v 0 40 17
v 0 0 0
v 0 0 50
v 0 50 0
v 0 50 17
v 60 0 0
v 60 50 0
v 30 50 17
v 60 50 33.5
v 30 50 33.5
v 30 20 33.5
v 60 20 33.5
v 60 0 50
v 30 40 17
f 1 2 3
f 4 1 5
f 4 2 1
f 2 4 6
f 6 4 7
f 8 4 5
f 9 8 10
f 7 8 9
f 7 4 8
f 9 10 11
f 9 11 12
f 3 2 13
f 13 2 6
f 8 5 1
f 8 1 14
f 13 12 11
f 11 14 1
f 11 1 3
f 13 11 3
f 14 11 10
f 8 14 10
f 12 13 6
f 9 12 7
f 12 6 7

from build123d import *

# Parameters (mm, degrees)
SKETCH1_W           = 60
SKETCH1_H           = 50
BOSS_EXTRUDE1_DEPTH = 50
SKETCH2_W           = 30
SKETCH2_H           = 10
CUT_EXTRUDE1_DEPTH  = 40
SKETCH3_W           = 30
SKETCH3_H           = 30
CUT_EXTRUDE2_DEPTH  = 30
SKETCH4_W           = 30
SKETCH4_H           = 10
BOSS_EXTRUDE2_DEPTH = 7
SKETCH5_W           = 30
SKETCH5_H           = 30
BOSS_EXTRUDE3_DEPTH = 12
CUT_EXTRUDE6_DEPTH  = 10
CUT_EXTRUDE7_DEPTH  = 20
CUT_EXTRUDE8_DEPTH  = 52
SKETCH13_W          = 30
SKETCH13_H          = 30
BOSS_EXTRUDE4_DEPTH = 1.5


with BuildPart() as part:
    # Sketch1 → Boss-Extrude1 (new body)
    with BuildSketch(Plane.XY):
        with Locations((30, 25)):
            Rectangle(SKETCH1_W, SKETCH1_H)
    extrude(amount=BOSS_EXTRUDE1_DEPTH)

    # Sketch2 → Cut-Extrude1 (cut)
    with BuildSketch(Plane.XY.offset(50)):
        with Locations((15, 45)):
            Rectangle(SKETCH2_W, SKETCH2_H)
    extrude(amount=-CUT_EXTRUDE1_DEPTH, mode=Mode.SUBTRACT)

    # Sketch3 → Cut-Extrude2 (cut)
    with BuildSketch(Plane.XY.offset(50)):
        with Locations((45, 35)):
            Rectangle(SKETCH3_W, SKETCH3_H)
    extrude(amount=-CUT_EXTRUDE2_DEPTH, mode=Mode.SUBTRACT)

    # Sketch4 → Boss-Extrude2 (add)
    with BuildSketch(Plane.XY.offset(10)):
        with Locations((15, 45)):
            Rectangle(SKETCH4_W, SKETCH4_H)
    extrude(amount=BOSS_EXTRUDE2_DEPTH)

    # Sketch5 → Boss-Extrude3 (add)
    with BuildSketch(Plane.XY.offset(20)):
        with Locations((45, 35)):
            Rectangle(SKETCH5_W, SKETCH5_H)
    extrude(amount=BOSS_EXTRUDE3_DEPTH)

    # Sketch10 → Cut-Extrude6 (cut)
    with BuildSketch(Plane(origin=(0, 0, 0), x_dir=(0, 0, -1), z_dir=(1, 0, 0))):
        Polygon((-17, 40), (-50, 0), (-50, 40), align=None)
    extrude(amount=CUT_EXTRUDE6_DEPTH, mode=Mode.SUBTRACT)

    # Sketch11 → Cut-Extrude7 (cut)
    with BuildSketch(Plane.ZY.offset(-10)):
        Polygon((17, 40), (50, 40), (50, 0), align=None)
    extrude(amount=-CUT_EXTRUDE7_DEPTH, mode=Mode.SUBTRACT)

    # Sketch12 → Cut-Extrude8 (cut)
    with BuildSketch(Plane.ZY.offset(-30)):
        Polygon((33.5, 20), (50, 0), (50, 20), align=None)
    extrude(amount=-CUT_EXTRUDE8_DEPTH, mode=Mode.SUBTRACT)

    # Sketch13 → Boss-Extrude4 (add)
    with BuildSketch(Plane.XY.offset(32)):
        with Locations((45, 35)):
            Rectangle(SKETCH13_W, SKETCH13_H)
    extrude(amount=BOSS_EXTRUDE4_DEPTH)


solid = part.part
